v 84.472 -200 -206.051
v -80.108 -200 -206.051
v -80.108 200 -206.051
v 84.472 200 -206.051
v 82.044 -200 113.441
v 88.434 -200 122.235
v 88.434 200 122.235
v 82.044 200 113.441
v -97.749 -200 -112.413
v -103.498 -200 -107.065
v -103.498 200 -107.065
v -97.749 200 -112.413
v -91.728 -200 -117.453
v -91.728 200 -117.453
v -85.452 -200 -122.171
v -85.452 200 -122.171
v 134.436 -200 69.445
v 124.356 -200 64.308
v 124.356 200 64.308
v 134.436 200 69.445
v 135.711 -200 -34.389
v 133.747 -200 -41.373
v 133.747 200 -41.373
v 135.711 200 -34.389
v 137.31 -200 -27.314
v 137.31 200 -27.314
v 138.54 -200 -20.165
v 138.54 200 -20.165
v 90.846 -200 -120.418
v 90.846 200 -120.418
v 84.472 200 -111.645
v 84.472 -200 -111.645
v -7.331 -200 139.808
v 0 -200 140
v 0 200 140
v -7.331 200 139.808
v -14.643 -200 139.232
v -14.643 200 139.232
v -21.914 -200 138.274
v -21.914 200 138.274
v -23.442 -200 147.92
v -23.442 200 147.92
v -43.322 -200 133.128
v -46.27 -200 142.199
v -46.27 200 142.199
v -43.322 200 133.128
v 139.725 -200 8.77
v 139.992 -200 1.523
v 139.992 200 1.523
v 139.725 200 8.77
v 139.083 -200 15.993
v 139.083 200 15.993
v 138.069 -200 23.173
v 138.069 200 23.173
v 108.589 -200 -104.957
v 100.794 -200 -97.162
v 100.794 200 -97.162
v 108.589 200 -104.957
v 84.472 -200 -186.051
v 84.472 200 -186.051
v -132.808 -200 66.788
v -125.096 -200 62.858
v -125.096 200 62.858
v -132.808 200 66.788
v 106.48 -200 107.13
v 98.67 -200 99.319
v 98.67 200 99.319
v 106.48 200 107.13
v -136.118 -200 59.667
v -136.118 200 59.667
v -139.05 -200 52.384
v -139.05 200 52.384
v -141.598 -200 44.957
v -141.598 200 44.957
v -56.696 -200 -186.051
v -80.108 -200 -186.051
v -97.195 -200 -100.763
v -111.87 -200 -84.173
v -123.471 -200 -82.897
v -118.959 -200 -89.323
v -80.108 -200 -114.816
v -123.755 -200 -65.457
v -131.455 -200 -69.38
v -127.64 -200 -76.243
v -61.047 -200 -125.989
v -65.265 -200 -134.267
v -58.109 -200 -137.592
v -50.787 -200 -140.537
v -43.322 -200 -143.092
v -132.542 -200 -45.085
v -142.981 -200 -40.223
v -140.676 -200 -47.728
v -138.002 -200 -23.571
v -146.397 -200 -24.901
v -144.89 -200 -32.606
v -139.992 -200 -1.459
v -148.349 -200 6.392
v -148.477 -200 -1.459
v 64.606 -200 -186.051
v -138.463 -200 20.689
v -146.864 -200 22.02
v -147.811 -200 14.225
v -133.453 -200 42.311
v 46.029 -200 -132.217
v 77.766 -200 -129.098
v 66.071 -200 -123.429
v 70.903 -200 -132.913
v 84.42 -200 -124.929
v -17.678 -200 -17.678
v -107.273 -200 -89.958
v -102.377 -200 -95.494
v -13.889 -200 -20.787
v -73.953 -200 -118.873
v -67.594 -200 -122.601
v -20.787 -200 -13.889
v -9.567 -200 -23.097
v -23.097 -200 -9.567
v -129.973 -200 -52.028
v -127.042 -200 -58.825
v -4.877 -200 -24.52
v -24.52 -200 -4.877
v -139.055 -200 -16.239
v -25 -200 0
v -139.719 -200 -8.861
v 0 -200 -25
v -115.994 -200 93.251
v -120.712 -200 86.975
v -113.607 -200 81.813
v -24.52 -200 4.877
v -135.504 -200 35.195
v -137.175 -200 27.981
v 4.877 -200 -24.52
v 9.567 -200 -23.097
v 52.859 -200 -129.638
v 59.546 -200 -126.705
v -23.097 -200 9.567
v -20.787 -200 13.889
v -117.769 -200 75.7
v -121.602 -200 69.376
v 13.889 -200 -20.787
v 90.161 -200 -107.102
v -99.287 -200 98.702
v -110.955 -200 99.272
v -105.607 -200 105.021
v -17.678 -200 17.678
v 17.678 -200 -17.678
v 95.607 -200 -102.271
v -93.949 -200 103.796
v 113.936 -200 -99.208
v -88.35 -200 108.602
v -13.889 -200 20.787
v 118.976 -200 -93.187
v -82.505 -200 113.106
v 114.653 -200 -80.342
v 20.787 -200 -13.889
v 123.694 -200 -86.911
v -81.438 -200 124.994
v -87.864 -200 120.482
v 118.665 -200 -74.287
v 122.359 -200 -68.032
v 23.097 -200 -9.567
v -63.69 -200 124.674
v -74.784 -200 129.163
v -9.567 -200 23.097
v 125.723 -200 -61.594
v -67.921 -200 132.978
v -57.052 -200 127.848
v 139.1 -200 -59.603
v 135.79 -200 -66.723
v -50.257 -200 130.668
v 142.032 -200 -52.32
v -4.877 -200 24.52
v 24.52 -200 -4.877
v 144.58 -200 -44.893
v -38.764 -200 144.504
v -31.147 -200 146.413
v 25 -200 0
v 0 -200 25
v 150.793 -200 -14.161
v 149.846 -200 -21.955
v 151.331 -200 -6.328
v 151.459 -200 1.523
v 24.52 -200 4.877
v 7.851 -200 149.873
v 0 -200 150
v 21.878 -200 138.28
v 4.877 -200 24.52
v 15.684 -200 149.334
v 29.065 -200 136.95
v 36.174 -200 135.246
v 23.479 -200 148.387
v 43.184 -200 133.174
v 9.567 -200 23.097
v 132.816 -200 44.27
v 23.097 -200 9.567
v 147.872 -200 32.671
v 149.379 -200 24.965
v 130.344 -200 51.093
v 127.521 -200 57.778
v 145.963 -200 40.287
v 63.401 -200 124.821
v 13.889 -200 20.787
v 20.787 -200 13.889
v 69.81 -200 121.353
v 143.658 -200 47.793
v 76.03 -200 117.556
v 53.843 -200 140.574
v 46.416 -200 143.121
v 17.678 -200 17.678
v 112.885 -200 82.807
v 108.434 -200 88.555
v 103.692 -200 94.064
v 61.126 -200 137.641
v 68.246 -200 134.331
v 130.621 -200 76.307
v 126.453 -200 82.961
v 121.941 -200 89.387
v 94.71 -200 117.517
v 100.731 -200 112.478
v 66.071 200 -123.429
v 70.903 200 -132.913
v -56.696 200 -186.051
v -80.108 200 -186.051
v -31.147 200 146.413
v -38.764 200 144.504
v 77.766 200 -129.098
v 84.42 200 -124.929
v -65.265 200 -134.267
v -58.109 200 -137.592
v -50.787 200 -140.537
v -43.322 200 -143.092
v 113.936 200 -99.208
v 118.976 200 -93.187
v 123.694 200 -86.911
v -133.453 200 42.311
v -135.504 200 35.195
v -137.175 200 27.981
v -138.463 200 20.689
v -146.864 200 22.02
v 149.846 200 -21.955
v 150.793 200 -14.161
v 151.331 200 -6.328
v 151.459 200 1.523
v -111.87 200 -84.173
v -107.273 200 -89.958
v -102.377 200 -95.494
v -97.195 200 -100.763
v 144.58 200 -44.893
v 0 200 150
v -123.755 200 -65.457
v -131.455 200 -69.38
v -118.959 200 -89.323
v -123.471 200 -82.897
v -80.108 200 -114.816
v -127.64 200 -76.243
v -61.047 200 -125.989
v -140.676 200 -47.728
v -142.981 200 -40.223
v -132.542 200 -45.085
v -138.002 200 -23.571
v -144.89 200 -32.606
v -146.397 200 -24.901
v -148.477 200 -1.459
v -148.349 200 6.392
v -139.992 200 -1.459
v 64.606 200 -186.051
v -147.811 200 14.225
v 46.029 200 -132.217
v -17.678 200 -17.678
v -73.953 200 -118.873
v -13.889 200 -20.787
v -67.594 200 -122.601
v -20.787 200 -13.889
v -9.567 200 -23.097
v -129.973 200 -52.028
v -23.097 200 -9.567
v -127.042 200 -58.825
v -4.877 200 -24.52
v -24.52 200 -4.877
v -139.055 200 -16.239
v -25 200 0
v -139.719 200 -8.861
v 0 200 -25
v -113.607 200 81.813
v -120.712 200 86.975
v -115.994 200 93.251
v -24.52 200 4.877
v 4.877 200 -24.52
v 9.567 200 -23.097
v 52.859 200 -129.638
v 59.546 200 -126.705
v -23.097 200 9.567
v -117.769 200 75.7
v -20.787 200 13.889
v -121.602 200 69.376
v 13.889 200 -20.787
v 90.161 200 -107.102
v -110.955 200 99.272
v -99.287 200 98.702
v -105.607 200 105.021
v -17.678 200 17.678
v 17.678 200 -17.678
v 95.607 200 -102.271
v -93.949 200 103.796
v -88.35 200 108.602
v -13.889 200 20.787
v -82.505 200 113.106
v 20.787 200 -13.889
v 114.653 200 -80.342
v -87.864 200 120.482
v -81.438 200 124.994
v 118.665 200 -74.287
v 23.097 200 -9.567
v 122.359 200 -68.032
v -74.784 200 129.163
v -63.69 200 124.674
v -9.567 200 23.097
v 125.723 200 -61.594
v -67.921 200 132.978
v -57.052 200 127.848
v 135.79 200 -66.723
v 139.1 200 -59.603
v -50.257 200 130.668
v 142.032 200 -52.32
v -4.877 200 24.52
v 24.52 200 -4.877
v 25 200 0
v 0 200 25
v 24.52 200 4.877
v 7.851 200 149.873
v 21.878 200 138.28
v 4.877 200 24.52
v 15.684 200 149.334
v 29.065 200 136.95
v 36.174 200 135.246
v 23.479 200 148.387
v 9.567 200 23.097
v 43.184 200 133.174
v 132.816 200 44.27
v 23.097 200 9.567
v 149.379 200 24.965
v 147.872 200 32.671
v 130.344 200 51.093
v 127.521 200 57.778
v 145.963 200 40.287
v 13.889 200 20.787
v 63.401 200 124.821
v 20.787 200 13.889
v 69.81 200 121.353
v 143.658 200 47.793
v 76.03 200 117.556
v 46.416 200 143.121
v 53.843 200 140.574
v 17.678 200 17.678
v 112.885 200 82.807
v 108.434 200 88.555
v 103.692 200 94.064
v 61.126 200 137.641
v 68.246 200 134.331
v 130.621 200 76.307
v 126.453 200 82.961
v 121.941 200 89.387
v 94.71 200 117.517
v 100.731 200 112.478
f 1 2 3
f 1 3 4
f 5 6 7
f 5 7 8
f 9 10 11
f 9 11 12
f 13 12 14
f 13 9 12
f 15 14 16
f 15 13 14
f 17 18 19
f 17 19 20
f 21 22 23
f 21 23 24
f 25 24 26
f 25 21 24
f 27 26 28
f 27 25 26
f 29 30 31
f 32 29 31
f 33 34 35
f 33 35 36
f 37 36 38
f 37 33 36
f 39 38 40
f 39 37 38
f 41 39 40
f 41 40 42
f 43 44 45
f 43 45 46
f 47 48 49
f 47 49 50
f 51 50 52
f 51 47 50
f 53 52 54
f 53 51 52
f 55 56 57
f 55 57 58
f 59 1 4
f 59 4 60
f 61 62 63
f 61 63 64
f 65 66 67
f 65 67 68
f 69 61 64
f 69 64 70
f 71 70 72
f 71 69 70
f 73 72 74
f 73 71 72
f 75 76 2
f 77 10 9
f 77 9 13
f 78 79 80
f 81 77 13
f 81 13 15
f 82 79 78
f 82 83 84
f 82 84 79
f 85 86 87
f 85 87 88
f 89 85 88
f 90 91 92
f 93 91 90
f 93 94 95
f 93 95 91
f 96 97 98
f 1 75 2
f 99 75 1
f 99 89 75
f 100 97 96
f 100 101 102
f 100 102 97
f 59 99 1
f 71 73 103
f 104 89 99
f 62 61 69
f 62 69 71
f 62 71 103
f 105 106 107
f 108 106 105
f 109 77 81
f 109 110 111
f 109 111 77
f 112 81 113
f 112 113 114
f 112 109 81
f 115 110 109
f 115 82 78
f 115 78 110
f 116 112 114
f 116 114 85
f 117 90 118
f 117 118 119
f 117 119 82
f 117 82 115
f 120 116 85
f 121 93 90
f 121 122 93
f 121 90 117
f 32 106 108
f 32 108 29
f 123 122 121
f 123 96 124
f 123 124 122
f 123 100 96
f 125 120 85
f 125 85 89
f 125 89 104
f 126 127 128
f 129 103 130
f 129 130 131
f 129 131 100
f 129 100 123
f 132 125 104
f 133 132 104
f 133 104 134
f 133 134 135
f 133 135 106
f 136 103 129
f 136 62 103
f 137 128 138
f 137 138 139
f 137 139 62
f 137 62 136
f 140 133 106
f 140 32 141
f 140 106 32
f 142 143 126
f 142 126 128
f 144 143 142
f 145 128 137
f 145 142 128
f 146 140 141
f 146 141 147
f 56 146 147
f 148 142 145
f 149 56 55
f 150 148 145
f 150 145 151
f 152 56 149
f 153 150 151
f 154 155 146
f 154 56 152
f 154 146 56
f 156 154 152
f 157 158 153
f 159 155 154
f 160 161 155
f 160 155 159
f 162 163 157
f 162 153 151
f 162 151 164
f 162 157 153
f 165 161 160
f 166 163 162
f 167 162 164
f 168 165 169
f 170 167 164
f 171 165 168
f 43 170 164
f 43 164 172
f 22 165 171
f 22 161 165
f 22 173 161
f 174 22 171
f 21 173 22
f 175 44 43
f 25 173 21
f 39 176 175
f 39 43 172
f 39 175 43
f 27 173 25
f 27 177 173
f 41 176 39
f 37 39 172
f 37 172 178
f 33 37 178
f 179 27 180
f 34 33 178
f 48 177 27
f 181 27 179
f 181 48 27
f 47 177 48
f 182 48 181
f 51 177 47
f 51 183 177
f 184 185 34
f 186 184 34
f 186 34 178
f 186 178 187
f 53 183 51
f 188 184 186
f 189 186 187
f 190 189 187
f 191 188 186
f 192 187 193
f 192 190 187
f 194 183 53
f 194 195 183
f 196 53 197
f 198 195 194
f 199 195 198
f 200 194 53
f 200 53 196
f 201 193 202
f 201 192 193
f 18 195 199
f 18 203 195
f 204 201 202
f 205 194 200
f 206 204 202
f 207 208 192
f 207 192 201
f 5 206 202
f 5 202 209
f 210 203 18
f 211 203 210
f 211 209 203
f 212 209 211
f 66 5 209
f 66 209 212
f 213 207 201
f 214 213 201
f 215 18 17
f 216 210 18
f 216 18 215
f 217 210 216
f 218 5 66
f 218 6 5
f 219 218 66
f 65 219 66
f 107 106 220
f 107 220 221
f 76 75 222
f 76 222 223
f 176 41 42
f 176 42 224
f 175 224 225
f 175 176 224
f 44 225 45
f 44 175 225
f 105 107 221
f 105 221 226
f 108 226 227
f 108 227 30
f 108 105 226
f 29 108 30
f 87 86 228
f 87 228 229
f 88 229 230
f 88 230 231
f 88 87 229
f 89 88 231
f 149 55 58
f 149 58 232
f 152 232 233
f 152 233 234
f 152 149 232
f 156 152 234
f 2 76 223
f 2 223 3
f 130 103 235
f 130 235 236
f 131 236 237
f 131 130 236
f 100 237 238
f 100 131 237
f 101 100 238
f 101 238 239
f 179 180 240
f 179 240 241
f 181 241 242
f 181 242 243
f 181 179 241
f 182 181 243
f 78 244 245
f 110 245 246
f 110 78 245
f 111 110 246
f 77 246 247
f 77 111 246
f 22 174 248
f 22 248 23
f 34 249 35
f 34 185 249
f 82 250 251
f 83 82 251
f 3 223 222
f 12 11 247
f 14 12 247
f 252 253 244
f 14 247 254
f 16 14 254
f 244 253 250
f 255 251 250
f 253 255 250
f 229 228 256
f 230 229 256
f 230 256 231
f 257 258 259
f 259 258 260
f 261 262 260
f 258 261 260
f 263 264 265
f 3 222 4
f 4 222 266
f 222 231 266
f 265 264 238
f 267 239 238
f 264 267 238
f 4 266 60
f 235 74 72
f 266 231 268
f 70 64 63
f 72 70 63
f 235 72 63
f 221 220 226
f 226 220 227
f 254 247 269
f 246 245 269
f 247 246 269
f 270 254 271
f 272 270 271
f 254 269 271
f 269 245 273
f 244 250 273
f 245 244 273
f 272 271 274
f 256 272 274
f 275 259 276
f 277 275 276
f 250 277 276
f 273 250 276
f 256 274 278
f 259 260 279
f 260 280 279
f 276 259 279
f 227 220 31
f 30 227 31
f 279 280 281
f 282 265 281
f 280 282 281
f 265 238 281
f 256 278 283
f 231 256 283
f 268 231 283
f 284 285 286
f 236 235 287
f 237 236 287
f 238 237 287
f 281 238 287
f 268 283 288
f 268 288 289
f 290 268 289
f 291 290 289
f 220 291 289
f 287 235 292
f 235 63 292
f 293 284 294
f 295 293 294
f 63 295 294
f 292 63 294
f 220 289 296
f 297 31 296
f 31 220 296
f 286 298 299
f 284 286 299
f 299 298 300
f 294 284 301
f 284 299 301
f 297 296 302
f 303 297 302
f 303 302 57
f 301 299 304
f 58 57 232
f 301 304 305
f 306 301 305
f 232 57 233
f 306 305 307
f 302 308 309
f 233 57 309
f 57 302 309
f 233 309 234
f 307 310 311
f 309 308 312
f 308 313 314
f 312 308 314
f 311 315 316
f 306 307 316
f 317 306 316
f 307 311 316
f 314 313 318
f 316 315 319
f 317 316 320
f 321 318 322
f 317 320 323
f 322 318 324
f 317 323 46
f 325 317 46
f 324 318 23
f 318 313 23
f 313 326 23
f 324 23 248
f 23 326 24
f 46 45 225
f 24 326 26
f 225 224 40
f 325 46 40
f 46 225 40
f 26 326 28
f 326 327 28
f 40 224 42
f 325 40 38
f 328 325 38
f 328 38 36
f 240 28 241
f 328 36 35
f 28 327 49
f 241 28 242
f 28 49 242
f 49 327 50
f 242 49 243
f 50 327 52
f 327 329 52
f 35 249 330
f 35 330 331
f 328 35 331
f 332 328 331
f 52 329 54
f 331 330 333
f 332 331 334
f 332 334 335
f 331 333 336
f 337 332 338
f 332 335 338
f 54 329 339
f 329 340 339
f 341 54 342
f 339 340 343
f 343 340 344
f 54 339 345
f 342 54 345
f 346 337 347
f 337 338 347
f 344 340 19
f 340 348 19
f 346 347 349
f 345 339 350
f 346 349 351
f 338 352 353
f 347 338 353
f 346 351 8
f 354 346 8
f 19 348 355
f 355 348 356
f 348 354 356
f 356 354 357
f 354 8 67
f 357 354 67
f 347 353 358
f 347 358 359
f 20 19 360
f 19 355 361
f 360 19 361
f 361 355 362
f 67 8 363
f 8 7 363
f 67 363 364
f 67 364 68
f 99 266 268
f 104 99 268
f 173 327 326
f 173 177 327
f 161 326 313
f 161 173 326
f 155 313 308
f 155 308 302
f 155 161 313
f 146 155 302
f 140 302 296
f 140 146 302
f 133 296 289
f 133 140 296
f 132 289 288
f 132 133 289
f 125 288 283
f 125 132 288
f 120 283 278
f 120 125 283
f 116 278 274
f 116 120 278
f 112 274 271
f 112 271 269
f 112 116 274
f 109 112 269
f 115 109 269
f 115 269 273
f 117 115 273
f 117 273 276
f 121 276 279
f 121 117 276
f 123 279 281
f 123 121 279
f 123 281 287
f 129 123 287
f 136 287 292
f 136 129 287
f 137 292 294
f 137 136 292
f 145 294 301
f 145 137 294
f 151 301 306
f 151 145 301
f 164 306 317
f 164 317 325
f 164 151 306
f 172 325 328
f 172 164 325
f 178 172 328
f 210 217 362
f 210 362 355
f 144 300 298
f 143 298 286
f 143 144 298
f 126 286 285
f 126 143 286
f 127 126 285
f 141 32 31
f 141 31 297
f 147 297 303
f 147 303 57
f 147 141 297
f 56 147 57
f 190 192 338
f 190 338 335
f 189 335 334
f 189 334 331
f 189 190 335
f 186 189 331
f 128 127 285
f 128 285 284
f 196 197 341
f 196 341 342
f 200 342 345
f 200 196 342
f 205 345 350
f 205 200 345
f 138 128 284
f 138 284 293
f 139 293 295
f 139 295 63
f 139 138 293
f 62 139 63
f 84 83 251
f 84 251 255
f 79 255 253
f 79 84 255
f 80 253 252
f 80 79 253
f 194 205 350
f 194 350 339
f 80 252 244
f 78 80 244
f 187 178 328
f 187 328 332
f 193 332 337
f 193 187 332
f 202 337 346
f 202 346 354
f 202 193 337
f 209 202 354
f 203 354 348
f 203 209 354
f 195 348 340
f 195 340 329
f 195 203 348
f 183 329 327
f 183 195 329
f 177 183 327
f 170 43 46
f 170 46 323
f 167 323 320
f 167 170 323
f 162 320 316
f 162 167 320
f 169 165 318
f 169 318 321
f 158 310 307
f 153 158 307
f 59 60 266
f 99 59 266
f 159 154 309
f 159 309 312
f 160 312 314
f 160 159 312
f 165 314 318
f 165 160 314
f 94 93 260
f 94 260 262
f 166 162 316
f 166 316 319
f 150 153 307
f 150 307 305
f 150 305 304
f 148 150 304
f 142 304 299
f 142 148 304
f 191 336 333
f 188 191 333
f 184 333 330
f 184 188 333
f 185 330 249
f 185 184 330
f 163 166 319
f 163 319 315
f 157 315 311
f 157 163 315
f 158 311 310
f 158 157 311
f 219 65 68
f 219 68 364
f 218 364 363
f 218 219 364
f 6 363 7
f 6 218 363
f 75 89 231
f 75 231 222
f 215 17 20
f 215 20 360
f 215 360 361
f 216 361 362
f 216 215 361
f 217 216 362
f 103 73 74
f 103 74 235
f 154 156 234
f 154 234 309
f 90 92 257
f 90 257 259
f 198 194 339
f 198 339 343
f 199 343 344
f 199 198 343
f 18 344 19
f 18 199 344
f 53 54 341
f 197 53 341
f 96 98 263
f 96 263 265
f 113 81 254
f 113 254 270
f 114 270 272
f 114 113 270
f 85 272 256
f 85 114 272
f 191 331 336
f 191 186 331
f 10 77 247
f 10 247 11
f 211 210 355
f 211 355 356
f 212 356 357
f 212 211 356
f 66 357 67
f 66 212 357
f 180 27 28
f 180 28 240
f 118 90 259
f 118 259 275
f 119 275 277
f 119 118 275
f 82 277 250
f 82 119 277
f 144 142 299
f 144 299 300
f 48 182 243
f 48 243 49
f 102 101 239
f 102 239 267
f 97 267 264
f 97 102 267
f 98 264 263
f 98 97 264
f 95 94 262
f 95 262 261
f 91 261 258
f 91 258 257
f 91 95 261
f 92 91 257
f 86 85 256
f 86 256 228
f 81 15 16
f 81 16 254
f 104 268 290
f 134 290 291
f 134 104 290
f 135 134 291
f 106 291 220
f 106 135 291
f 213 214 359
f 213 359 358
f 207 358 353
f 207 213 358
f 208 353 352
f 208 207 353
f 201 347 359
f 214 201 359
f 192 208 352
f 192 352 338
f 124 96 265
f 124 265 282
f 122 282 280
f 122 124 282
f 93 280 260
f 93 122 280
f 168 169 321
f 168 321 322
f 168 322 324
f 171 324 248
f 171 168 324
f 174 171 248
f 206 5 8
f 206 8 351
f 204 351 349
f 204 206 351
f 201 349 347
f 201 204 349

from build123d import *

# Parameters (mm, degrees)
F1_DEPTH = 200


with BuildPart() as f1:
    # F0 (on Front) → F1 (new body, symmetric)
    with BuildSketch(Plane.XZ):
        with BuildLine():
            Line((0, 150), (0, 140))
            ThreePointArc((0, 140), (-10.990919, 139.567904), (-21.913993, 138.274282))
            Line((-21.913993, 138.274282), (-23.441789, 147.920408))
            ThreePointArc((-23.441789, 147.920408), (-34.968111, 145.508317), (-46.269651, 142.199316))
            Line((-46.269651, 142.199316), (-43.322337, 133.128416))
            ThreePointArc((-43.322337, 133.128416), (-53.673121, 129.30273), (-63.690435, 124.673688))
            Line((-63.690435, 124.673688), (-67.921488, 132.977595))
            ThreePointArc((-67.921488, 132.977595), (-78.138294, 127.121731), (-87.86416, 120.482316))
            Line((-87.86416, 120.482316), (-82.50488, 113.105901))
            ThreePointArc((-82.50488, 113.105901), (-91.18094, 106.235757), (-99.287246, 98.701787))
            Line((-99.287246, 98.701787), (-105.606612, 105.021153))
            ThreePointArc((-105.606612, 105.021153), (-113.51381, 96.294728), (-120.711966, 86.974812))
            Line((-120.711966, 86.974812), (-113.607356, 81.81301))
            ThreePointArc((-113.607356, 81.81301), (-119.727162, 72.563122), (-125.095543, 62.857817))
            Line((-125.095543, 62.857817), (-132.808279, 66.787653))
            ThreePointArc((-132.808279, 66.787653), (-137.631858, 56.04487), (-141.597698, 44.956751))
            Line((-141.597698, 44.956751), (-133.453437, 42.31052))
            ThreePointArc((-133.453437, 42.31052), (-136.387276, 31.599222), (-138.462855, 20.689076))
            Line((-138.462855, 20.689076), (-146.8638, 22.019655))
            ThreePointArc((-146.8638, 22.019655), (-148.131594, 10.312094), (-148.476915, -1.458846))
            Line((-148.476915, -1.458846), (-139.992399, -1.458846))
            ThreePointArc((-139.992399, -1.458846), (-139.435962, -12.554384), (-138.001501, -23.570867))
            Line((-138.001501, -23.570867), (-146.397324, -24.900635))
            ThreePointArc((-146.397324, -24.900635), (-143.985232, -36.426957), (-140.676231, -47.728497))
            Line((-140.676231, -47.728497), (-132.541707, -45.085429))
            ThreePointArc((-132.541707, -45.085429), (-128.552613, -55.4457), (-123.755159, -65.457318))
            Line((-123.755159, -65.457318), (-131.454511, -69.380334))
            ThreePointArc((-131.454511, -69.380334), (-125.598646, -79.59714), (-118.959231, -89.323006))
            Line((-118.959231, -89.323006), (-111.870329, -84.172617))
            ThreePointArc((-111.870329, -84.172617), (-104.861356, -92.758267), (-97.195184, -100.762573))
            Line((-97.195184, -100.762573), (-103.498068, -107.065458))
            ThreePointArc((-103.498068, -107.065458), (-94.771643, -114.972656), (-85.451727, -122.170812))
            Line((-85.451727, -122.170812), (-80.108083, -114.815918))
            ThreePointArc((-80.108083, -114.815918), (-70.798197, -120.779201), (-61.046779, -125.989248))
            Line((-61.046779, -125.989248), (-65.264568, -134.267125))
            ThreePointArc((-65.264568, -134.267125), (-54.467372, -139.112599), (-43.321732, -143.09164))
            ThreePointArc((-43.321732, -143.09164), (2.292038, -145.364646), (46.028998, -132.216986))
            ThreePointArc((46.028998, -132.216986), (56.22186, -128.215063), (66.070765, -123.428741))
            Line((66.070765, -123.428741), (70.903418, -132.913357))
            ThreePointArc((70.903418, -132.913357), (81.120225, -127.057492), (90.84609, -120.418077))
            Line((90.84609, -120.418077), (84.471787, -111.644602))
            ThreePointArc((84.471787, -111.644602), (92.915532, -104.722032), (100.794109, -97.162481))
            Line((100.794109, -97.162481), (108.588542, -104.956914))
            ThreePointArc((108.588542, -104.956914), (116.495741, -96.230489), (123.693897, -86.910573))
            Line((123.693897, -86.910573), (114.652585, -80.341675))
            ThreePointArc((114.652585, -80.341675), (120.552663, -71.183252), (125.722736, -61.59378))
            Line((125.722736, -61.59378), (135.790209, -66.723414))
            ThreePointArc((135.790209, -66.723414), (140.613788, -55.980632), (144.579629, -44.892512))
            Line((144.579629, -44.892512), (133.747113, -41.372814))
            ThreePointArc((133.747113, -41.372814), (136.555986, -30.861994), (138.540179, -20.164793))
            Line((138.540179, -20.164793), (149.845731, -21.955417))
            ThreePointArc((149.845731, -21.955417), (151.113525, -10.247856), (151.458846, 1.523085))
            Line((151.458846, 1.523085), (139.991715, 1.523085))
            ThreePointArc((139.991715, 1.523085), (139.451051, 12.385652), (138.068788, 23.173472))
            Line((138.068788, 23.173472), (149.379254, 24.964874))
            ThreePointArc((149.379254, 24.964874), (146.967163, 36.491196), (143.658162, 47.792735))
            Line((143.658162, 47.792735), (132.816291, 44.269998))
            ThreePointArc((132.816291, 44.269998), (128.975931, 54.453735), (124.356076, 64.308369))
            Line((124.356076, 64.308369), (134.436441, 69.444572))
            ThreePointArc((134.436441, 69.444572), (128.580576, 79.661379), (121.941162, 89.387244))
            Line((121.941162, 89.387244), (112.884668, 82.807316))
            ThreePointArc((112.884668, 82.807316), (106.098821, 91.340244), (98.669568, 99.319265))
            Line((98.669568, 99.319265), (106.479999, 107.129696))
            ThreePointArc((106.479999, 107.129696), (97.753574, 115.036895), (88.433658, 122.235051))
            Line((88.433658, 122.235051), (82.044101, 113.440581))
            ThreePointArc((82.044101, 113.440581), (72.944753, 119.495034), (63.400833, 124.82121))
            Line((63.400833, 124.82121), (68.246499, 134.331363))
            ThreePointArc((68.246499, 134.331363), (57.503716, 139.154943), (46.415597, 143.120783))
            Line((46.415597, 143.120783), (43.183531, 133.173506))
            ThreePointArc((43.183531, 133.173506), (32.630677, 136.144184), (21.877732, 138.280023))
            Line((21.877732, 138.280023), (23.478501, 148.386885))
            ThreePointArc((23.478501, 148.386885), (11.77094, 149.654679), (0, 150))
        make_face()
        with BuildLine():
            ThreePointArc((0, 25), (17.67767, 17.67767), (25, 0))
            ThreePointArc((25, 0), (-17.67767, -17.67767), (0, 25))
        make_face(mode=Mode.SUBTRACT)
        with BuildLine():
            ThreePointArc((46.028998, -132.216986), (2.292038, -145.364646), (-43.321732, -143.09164))
            Line((-43.321732, -143.09164), (-56.696378, -186.051216))
            Line((-56.696378, -186.051216), (-80.108083, -186.051216))
            Line((-80.108083, -186.051216), (-80.108083, -206.051216))
            Line((-80.108083, -206.051216), (84.471787, -206.051216))
            Line((84.471787, -206.051216), (84.471787, -186.051216))
            Line((84.471787, -186.051216), (64.606167, -186.051216))
            Line((64.606167, -186.051216), (46.028998, -132.216986))
        make_face()
    extrude(amount=F1_DEPTH, both=True)


solid = f1.part
